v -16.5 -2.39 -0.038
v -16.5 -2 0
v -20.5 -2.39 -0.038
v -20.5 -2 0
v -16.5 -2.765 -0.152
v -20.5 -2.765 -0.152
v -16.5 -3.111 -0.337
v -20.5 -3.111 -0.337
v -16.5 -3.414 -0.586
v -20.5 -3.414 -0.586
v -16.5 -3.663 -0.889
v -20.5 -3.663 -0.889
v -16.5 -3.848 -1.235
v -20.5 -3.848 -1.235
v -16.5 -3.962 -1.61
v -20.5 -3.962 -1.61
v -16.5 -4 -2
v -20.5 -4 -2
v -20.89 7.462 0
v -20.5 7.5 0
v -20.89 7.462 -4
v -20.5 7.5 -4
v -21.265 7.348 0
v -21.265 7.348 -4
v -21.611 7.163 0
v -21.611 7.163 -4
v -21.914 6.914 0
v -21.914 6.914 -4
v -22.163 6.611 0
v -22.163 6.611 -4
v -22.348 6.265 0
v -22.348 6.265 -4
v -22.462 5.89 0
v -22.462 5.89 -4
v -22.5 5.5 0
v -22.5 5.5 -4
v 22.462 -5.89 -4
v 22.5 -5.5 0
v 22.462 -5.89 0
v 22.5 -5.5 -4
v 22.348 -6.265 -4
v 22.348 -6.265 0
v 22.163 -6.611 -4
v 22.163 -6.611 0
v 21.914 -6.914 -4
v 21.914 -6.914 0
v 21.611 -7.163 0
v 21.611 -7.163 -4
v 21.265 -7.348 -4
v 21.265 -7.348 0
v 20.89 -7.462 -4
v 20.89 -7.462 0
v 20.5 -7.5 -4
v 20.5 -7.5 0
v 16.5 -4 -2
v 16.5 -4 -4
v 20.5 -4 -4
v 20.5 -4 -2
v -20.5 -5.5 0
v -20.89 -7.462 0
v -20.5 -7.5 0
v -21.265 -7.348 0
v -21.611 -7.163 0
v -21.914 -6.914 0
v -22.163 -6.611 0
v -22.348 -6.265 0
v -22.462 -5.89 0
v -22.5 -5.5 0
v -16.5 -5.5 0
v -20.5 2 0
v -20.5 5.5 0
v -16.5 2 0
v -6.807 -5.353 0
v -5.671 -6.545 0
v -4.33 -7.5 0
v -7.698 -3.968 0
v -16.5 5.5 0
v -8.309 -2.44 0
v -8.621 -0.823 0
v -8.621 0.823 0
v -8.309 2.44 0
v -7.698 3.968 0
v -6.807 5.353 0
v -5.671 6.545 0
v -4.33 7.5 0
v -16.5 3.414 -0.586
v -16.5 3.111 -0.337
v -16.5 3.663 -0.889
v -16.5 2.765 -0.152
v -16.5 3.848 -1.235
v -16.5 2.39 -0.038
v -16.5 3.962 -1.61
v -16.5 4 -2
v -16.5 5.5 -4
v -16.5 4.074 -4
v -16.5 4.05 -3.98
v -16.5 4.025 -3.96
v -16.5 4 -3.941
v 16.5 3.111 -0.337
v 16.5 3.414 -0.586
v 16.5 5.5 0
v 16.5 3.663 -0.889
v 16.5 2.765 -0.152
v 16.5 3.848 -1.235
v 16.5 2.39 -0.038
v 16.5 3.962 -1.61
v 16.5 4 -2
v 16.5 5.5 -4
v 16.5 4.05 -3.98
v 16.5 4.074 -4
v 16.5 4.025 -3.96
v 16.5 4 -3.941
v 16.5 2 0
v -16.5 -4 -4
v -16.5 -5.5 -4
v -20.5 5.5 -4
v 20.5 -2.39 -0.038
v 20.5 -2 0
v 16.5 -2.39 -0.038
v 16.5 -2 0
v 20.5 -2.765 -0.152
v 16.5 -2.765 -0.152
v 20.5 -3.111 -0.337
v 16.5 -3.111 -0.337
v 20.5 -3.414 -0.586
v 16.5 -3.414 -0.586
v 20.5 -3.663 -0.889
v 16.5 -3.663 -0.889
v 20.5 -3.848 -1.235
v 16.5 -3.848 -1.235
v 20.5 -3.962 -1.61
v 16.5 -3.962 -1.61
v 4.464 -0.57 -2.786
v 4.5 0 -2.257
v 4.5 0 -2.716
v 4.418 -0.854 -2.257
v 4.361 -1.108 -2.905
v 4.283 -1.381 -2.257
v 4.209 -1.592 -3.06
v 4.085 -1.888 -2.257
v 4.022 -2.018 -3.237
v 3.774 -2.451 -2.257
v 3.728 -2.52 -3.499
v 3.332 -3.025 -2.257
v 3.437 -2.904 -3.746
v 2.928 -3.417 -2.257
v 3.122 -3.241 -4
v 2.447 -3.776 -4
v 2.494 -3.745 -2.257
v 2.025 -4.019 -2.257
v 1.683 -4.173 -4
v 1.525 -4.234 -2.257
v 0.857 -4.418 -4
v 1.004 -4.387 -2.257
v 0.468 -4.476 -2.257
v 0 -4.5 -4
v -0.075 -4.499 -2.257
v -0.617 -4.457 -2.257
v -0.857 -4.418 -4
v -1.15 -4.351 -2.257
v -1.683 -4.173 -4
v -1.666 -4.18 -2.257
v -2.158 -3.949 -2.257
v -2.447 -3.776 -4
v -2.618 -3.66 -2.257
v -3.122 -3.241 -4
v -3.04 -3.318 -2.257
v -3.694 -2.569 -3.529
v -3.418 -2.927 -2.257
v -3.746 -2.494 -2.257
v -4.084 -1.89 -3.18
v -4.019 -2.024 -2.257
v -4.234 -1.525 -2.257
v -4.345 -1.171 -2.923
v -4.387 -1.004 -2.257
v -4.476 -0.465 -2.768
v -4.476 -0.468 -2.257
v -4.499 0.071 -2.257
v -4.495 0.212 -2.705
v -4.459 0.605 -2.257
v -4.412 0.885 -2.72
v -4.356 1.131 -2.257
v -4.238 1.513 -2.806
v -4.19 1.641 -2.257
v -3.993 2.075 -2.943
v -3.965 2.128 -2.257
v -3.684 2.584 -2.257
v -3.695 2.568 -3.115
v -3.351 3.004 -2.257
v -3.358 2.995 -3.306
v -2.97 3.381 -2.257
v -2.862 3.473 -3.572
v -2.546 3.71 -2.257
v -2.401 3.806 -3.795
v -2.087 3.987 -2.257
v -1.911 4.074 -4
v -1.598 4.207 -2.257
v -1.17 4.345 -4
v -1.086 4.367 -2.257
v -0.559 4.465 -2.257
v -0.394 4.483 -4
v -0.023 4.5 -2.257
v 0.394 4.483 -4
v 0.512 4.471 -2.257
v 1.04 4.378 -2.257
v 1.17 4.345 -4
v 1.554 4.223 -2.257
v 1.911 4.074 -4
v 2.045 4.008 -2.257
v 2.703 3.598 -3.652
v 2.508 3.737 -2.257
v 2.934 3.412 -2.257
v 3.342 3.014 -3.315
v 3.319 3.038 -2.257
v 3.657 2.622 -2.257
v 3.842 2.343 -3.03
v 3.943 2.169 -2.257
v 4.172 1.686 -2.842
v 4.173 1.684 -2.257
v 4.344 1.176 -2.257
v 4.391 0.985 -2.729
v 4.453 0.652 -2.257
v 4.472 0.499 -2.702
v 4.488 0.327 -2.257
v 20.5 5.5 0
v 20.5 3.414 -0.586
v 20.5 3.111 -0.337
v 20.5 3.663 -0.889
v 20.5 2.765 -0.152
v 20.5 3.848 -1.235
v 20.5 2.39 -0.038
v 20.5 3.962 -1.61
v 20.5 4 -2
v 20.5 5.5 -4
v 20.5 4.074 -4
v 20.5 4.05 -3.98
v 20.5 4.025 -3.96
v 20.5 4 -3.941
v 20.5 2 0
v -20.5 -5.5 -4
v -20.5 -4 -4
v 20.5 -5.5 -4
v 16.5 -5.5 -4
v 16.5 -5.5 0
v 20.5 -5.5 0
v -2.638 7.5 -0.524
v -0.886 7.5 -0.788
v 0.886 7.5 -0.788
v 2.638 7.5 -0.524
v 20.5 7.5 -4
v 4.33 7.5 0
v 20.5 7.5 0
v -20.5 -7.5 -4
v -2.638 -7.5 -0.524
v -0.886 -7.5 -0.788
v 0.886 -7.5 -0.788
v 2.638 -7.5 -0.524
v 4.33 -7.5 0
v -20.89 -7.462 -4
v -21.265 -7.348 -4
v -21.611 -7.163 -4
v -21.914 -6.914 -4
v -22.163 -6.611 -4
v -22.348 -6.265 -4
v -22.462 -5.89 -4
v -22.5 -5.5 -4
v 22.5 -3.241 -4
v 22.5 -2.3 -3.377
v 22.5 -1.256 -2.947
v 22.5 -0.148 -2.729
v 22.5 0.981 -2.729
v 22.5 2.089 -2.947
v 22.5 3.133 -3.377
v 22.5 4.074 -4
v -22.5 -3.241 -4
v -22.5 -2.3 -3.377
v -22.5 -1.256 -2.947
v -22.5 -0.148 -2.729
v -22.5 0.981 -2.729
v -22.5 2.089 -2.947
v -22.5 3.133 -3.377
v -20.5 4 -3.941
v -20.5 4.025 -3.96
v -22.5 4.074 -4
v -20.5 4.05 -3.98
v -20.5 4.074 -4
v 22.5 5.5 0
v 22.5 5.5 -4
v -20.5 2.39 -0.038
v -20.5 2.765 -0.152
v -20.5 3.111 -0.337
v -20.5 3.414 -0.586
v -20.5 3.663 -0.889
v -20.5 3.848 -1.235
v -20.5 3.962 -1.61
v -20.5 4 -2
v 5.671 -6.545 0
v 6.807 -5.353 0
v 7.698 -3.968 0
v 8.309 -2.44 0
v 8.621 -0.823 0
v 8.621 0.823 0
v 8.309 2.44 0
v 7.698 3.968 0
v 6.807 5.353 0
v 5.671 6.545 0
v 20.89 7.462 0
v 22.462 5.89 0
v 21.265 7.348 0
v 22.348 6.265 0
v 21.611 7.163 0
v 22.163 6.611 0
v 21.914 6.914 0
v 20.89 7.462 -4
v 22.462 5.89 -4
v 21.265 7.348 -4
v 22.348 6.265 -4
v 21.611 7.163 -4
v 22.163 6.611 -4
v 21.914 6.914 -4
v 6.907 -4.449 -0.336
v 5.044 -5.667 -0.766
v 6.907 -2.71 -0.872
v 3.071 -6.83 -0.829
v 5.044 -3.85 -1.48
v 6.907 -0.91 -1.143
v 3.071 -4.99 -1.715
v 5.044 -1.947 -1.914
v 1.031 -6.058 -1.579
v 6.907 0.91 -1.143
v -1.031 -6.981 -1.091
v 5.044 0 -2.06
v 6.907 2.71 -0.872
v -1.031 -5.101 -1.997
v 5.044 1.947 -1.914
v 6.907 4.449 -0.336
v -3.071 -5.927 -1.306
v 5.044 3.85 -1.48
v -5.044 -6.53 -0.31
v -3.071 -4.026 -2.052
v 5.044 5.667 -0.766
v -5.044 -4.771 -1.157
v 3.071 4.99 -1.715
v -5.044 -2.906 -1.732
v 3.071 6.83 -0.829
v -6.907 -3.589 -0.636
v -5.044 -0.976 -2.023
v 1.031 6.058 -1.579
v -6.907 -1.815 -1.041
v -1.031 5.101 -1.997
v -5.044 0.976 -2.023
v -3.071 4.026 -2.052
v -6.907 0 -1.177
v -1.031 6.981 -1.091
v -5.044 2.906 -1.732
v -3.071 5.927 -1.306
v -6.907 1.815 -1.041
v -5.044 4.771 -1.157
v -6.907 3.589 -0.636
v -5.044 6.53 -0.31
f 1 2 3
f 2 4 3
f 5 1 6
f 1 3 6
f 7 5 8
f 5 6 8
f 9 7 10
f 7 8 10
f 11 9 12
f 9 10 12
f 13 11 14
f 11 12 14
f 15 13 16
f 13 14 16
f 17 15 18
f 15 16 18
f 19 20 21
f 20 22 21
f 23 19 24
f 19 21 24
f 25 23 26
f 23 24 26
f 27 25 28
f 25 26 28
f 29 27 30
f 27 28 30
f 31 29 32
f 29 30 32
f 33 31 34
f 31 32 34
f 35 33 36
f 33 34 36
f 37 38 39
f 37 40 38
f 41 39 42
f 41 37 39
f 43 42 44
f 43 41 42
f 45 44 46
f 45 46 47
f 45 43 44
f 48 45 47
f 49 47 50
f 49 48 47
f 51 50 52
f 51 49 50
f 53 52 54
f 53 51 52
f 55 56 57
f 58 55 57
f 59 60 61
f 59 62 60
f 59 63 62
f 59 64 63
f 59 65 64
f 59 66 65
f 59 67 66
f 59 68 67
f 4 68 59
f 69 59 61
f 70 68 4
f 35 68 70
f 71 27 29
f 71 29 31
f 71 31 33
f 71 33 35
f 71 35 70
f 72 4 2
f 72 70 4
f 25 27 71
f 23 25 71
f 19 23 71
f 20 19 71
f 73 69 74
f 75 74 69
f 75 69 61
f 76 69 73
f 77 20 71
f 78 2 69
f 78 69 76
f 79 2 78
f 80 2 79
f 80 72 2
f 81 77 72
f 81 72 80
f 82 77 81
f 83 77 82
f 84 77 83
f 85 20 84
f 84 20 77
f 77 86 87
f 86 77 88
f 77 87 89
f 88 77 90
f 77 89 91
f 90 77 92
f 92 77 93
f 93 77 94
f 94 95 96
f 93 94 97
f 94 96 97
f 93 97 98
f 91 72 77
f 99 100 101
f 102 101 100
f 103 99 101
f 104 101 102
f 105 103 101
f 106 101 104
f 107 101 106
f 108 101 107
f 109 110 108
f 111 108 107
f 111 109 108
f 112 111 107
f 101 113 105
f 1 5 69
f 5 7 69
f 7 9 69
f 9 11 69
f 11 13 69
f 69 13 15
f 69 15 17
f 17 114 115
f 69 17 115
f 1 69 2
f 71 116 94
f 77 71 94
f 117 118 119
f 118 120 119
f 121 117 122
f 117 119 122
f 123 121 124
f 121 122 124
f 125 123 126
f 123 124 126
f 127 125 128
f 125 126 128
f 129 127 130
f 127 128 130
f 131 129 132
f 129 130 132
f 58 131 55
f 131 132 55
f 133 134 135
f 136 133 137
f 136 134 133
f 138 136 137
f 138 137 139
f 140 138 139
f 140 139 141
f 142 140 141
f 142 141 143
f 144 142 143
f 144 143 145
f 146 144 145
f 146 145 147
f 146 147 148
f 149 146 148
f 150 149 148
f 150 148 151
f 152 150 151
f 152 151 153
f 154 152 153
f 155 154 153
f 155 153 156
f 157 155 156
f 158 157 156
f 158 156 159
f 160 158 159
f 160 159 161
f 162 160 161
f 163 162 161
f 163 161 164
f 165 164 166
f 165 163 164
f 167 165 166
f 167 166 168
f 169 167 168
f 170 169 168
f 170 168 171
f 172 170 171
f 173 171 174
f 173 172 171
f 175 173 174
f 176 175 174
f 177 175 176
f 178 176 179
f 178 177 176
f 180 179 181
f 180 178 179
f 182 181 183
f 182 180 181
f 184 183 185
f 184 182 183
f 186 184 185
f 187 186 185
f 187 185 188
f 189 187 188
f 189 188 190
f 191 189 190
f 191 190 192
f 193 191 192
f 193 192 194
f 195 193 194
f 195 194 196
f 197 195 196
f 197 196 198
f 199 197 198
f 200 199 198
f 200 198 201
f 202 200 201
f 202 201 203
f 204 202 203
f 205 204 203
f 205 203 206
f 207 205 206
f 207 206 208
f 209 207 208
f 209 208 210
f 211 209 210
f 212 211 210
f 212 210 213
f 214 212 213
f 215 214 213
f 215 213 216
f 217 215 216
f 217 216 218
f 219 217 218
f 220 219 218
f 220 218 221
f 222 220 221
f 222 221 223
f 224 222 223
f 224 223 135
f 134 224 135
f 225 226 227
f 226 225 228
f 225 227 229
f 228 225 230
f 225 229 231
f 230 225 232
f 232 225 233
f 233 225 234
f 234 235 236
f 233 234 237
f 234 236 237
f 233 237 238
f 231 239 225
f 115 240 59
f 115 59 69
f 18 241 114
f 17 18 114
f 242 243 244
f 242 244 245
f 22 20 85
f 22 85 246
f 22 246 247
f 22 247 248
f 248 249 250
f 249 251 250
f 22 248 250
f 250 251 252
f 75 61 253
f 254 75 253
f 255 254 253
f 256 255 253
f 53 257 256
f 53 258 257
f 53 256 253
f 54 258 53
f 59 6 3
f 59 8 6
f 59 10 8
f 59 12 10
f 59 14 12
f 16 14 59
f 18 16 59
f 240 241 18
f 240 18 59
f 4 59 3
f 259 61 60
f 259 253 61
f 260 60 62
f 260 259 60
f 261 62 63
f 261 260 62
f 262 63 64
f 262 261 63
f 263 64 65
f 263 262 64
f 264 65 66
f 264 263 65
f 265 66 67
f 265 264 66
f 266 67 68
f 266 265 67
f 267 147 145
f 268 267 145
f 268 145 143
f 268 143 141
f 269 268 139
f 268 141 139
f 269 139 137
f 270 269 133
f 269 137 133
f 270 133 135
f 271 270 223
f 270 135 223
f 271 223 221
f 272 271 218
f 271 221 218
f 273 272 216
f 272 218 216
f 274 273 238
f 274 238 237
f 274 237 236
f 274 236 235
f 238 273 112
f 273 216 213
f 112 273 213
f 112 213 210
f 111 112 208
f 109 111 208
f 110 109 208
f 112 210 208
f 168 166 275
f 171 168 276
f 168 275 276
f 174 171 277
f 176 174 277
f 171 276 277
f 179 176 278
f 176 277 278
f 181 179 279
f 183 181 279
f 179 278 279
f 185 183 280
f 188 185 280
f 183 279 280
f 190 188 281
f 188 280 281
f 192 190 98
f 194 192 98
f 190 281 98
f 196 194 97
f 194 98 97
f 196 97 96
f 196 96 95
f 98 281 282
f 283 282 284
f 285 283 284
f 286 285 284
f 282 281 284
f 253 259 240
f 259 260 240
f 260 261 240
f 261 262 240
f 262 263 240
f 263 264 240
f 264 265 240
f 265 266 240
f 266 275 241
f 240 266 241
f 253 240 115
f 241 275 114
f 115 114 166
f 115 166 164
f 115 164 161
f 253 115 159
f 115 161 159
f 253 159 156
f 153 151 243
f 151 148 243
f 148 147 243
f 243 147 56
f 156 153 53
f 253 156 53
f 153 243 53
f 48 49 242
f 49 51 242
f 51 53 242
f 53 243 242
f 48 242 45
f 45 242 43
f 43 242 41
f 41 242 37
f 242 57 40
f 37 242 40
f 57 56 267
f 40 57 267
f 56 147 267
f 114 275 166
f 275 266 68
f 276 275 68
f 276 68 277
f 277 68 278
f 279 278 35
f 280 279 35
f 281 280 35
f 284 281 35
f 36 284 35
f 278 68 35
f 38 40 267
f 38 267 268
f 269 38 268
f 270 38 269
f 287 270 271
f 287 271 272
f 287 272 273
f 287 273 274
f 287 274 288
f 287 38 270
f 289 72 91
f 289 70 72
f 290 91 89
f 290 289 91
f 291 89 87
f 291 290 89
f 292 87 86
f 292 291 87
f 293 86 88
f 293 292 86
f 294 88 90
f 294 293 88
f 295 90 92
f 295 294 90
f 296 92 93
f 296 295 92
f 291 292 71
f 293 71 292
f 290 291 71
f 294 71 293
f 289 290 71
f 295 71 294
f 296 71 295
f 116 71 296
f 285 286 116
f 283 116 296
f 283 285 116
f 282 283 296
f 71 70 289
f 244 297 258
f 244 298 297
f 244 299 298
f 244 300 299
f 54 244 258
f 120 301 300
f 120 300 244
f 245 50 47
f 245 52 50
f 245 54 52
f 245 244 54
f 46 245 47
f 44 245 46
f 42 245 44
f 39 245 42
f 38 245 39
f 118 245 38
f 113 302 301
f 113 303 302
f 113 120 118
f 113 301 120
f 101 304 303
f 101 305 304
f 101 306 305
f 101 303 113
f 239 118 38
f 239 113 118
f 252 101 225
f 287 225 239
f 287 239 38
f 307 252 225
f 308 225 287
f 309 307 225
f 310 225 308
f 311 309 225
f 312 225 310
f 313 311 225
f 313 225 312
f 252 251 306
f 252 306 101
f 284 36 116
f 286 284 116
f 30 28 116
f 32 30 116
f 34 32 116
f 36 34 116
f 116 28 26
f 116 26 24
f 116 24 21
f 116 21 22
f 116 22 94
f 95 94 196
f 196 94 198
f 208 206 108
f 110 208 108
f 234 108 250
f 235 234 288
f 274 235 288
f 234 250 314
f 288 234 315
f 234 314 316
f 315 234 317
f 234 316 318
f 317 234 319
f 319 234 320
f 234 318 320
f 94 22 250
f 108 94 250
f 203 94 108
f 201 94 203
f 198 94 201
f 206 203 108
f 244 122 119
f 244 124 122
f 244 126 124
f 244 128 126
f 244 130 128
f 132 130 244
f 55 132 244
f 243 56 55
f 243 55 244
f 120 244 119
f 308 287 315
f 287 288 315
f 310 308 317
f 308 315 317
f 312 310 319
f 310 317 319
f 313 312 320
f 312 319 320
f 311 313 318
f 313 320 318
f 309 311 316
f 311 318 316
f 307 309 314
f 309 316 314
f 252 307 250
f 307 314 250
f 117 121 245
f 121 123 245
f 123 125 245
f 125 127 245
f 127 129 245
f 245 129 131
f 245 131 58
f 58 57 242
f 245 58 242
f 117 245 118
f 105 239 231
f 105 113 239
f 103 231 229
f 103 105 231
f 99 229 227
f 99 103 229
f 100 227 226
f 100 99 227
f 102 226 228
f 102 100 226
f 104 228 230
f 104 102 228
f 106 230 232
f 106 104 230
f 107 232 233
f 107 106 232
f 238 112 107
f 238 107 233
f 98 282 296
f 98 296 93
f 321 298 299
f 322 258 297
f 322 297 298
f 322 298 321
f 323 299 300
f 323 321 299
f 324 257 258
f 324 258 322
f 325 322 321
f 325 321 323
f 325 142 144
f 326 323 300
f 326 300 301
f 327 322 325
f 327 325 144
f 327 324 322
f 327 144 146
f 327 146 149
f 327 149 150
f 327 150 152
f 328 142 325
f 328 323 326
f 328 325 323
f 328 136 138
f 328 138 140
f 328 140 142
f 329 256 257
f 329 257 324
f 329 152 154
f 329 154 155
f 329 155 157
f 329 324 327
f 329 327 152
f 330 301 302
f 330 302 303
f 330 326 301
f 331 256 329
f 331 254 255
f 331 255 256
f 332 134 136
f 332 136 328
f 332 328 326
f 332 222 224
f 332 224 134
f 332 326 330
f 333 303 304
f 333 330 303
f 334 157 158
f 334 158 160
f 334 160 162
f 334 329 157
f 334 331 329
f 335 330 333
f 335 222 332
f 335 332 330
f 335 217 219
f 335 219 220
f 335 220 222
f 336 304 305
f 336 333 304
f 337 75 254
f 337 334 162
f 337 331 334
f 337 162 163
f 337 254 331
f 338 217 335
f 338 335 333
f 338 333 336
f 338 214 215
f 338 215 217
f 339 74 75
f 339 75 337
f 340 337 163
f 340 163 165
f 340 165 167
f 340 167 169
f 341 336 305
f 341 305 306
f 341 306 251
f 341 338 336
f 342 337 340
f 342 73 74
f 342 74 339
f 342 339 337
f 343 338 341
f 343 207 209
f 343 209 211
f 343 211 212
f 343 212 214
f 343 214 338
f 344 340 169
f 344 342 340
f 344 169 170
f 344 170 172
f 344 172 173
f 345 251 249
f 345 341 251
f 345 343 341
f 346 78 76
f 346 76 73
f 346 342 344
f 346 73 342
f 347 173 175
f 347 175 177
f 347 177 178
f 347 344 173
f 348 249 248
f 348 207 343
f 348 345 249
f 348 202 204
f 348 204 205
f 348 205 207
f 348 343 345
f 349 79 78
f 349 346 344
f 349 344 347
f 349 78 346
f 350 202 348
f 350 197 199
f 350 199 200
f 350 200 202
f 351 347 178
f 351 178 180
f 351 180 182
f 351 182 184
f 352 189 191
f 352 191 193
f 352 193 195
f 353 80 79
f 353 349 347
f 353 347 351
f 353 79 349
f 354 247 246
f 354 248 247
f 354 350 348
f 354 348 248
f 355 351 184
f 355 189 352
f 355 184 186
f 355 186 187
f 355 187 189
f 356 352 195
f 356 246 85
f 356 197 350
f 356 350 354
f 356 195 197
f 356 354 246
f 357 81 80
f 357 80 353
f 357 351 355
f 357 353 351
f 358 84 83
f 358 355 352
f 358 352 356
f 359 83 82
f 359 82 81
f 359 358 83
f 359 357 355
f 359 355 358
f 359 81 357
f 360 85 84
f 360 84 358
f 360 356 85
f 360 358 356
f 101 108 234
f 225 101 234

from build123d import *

# Parameters (mm, degrees)
F1_W      = 45
F1_H      = 15
F2_DEPTH  = 4
F6_R      = 4.5
F7_DEPTH  = 16
F8_W      = 4
F8_H      = 1.5
F9_DEPTH  = 25
F10_R     = 2
F11_R     = 2
F13_DEPTH = 50


with BuildPart() as f2:
    # F1 (on Top) → F2 (new body)
    with BuildSketch(Plane.XY):
        Rectangle(F1_W, F1_H)
    extrude(amount=-F2_DEPTH)

    # F4 (on offset) → F5 (revolve, cut)
    with BuildSketch(Plane(origin=(0, 0, 11), x_dir=(1, 0, 0), z_dir=(0, 0, -1))):
        with BuildLine():
            Line((-14, 0), (14, 0))
            ThreePointArc((14, 0), (0, 14), (-14, 0))
        make_face()
    revolve(axis=Axis((0, 0, 11), (1, 0, 0)), mode=Mode.SUBTRACT)

    # F6 (on offset) → F7 (cut)
    with BuildSketch(Plane(origin=(0, 0, 11), x_dir=(1, 0, 0), z_dir=(0, 0, -1))):
        Circle(F6_R)
    extrude(amount=F7_DEPTH, mode=Mode.SUBTRACT)

    # F8 (on face) → F9 (cut)
    with BuildSketch(Plane(origin=(0, 0, -4), x_dir=(1, 0, 0), z_dir=(0, 0, -1))):
        with Locations((-18.5, 4.75)):
            Rectangle(F8_W, F8_H)
        with Locations((18.5, 4.75)):
            Rectangle(F8_W, F8_H)
        with Locations((-18.5, -4.75)):
            Rectangle(F8_W, F8_H)
        with Locations((18.5, -4.75)):
            Rectangle(F8_W, F8_H)
    extrude(amount=-F9_DEPTH, mode=Mode.SUBTRACT)

    # F10
    f10_edges = [f2.edges().sort_by_distance(p)[0] for p in [
        (-18.5, -4, 0),
        (18.5, -4, 0),
        (18.5, 4, 0),
        (-18.5, 4, 0),
    ]]
    fillet(f10_edges, radius=F10_R)

    # F11
    f11_edges = [f2.edges().sort_by_distance(p)[0] for p in [
        (-22.5, -7.5, -2),
        (22.5, -7.5, -2),
        (22.5, 7.5, -2),
        (-22.5, 7.5, -2),
    ]]
    fillet(f11_edges, radius=F11_R)

    # F12 (on face) → F13 (cut)
    with BuildSketch(Plane(origin=(-22.5, 0, 0), x_dir=(0, -1, 0), z_dir=(-1, 0, 0))):
        with BuildLine():
            ThreePointArc((3.2411857887, -4), (-0.4165064602, -2.7009731345), (-4.074198709, -4))
            Line((-4.074198709, -4), (3.2411857887, -4))
        make_face()
    extrude(amount=-F13_DEPTH, mode=Mode.SUBTRACT)


solid = f2.part
